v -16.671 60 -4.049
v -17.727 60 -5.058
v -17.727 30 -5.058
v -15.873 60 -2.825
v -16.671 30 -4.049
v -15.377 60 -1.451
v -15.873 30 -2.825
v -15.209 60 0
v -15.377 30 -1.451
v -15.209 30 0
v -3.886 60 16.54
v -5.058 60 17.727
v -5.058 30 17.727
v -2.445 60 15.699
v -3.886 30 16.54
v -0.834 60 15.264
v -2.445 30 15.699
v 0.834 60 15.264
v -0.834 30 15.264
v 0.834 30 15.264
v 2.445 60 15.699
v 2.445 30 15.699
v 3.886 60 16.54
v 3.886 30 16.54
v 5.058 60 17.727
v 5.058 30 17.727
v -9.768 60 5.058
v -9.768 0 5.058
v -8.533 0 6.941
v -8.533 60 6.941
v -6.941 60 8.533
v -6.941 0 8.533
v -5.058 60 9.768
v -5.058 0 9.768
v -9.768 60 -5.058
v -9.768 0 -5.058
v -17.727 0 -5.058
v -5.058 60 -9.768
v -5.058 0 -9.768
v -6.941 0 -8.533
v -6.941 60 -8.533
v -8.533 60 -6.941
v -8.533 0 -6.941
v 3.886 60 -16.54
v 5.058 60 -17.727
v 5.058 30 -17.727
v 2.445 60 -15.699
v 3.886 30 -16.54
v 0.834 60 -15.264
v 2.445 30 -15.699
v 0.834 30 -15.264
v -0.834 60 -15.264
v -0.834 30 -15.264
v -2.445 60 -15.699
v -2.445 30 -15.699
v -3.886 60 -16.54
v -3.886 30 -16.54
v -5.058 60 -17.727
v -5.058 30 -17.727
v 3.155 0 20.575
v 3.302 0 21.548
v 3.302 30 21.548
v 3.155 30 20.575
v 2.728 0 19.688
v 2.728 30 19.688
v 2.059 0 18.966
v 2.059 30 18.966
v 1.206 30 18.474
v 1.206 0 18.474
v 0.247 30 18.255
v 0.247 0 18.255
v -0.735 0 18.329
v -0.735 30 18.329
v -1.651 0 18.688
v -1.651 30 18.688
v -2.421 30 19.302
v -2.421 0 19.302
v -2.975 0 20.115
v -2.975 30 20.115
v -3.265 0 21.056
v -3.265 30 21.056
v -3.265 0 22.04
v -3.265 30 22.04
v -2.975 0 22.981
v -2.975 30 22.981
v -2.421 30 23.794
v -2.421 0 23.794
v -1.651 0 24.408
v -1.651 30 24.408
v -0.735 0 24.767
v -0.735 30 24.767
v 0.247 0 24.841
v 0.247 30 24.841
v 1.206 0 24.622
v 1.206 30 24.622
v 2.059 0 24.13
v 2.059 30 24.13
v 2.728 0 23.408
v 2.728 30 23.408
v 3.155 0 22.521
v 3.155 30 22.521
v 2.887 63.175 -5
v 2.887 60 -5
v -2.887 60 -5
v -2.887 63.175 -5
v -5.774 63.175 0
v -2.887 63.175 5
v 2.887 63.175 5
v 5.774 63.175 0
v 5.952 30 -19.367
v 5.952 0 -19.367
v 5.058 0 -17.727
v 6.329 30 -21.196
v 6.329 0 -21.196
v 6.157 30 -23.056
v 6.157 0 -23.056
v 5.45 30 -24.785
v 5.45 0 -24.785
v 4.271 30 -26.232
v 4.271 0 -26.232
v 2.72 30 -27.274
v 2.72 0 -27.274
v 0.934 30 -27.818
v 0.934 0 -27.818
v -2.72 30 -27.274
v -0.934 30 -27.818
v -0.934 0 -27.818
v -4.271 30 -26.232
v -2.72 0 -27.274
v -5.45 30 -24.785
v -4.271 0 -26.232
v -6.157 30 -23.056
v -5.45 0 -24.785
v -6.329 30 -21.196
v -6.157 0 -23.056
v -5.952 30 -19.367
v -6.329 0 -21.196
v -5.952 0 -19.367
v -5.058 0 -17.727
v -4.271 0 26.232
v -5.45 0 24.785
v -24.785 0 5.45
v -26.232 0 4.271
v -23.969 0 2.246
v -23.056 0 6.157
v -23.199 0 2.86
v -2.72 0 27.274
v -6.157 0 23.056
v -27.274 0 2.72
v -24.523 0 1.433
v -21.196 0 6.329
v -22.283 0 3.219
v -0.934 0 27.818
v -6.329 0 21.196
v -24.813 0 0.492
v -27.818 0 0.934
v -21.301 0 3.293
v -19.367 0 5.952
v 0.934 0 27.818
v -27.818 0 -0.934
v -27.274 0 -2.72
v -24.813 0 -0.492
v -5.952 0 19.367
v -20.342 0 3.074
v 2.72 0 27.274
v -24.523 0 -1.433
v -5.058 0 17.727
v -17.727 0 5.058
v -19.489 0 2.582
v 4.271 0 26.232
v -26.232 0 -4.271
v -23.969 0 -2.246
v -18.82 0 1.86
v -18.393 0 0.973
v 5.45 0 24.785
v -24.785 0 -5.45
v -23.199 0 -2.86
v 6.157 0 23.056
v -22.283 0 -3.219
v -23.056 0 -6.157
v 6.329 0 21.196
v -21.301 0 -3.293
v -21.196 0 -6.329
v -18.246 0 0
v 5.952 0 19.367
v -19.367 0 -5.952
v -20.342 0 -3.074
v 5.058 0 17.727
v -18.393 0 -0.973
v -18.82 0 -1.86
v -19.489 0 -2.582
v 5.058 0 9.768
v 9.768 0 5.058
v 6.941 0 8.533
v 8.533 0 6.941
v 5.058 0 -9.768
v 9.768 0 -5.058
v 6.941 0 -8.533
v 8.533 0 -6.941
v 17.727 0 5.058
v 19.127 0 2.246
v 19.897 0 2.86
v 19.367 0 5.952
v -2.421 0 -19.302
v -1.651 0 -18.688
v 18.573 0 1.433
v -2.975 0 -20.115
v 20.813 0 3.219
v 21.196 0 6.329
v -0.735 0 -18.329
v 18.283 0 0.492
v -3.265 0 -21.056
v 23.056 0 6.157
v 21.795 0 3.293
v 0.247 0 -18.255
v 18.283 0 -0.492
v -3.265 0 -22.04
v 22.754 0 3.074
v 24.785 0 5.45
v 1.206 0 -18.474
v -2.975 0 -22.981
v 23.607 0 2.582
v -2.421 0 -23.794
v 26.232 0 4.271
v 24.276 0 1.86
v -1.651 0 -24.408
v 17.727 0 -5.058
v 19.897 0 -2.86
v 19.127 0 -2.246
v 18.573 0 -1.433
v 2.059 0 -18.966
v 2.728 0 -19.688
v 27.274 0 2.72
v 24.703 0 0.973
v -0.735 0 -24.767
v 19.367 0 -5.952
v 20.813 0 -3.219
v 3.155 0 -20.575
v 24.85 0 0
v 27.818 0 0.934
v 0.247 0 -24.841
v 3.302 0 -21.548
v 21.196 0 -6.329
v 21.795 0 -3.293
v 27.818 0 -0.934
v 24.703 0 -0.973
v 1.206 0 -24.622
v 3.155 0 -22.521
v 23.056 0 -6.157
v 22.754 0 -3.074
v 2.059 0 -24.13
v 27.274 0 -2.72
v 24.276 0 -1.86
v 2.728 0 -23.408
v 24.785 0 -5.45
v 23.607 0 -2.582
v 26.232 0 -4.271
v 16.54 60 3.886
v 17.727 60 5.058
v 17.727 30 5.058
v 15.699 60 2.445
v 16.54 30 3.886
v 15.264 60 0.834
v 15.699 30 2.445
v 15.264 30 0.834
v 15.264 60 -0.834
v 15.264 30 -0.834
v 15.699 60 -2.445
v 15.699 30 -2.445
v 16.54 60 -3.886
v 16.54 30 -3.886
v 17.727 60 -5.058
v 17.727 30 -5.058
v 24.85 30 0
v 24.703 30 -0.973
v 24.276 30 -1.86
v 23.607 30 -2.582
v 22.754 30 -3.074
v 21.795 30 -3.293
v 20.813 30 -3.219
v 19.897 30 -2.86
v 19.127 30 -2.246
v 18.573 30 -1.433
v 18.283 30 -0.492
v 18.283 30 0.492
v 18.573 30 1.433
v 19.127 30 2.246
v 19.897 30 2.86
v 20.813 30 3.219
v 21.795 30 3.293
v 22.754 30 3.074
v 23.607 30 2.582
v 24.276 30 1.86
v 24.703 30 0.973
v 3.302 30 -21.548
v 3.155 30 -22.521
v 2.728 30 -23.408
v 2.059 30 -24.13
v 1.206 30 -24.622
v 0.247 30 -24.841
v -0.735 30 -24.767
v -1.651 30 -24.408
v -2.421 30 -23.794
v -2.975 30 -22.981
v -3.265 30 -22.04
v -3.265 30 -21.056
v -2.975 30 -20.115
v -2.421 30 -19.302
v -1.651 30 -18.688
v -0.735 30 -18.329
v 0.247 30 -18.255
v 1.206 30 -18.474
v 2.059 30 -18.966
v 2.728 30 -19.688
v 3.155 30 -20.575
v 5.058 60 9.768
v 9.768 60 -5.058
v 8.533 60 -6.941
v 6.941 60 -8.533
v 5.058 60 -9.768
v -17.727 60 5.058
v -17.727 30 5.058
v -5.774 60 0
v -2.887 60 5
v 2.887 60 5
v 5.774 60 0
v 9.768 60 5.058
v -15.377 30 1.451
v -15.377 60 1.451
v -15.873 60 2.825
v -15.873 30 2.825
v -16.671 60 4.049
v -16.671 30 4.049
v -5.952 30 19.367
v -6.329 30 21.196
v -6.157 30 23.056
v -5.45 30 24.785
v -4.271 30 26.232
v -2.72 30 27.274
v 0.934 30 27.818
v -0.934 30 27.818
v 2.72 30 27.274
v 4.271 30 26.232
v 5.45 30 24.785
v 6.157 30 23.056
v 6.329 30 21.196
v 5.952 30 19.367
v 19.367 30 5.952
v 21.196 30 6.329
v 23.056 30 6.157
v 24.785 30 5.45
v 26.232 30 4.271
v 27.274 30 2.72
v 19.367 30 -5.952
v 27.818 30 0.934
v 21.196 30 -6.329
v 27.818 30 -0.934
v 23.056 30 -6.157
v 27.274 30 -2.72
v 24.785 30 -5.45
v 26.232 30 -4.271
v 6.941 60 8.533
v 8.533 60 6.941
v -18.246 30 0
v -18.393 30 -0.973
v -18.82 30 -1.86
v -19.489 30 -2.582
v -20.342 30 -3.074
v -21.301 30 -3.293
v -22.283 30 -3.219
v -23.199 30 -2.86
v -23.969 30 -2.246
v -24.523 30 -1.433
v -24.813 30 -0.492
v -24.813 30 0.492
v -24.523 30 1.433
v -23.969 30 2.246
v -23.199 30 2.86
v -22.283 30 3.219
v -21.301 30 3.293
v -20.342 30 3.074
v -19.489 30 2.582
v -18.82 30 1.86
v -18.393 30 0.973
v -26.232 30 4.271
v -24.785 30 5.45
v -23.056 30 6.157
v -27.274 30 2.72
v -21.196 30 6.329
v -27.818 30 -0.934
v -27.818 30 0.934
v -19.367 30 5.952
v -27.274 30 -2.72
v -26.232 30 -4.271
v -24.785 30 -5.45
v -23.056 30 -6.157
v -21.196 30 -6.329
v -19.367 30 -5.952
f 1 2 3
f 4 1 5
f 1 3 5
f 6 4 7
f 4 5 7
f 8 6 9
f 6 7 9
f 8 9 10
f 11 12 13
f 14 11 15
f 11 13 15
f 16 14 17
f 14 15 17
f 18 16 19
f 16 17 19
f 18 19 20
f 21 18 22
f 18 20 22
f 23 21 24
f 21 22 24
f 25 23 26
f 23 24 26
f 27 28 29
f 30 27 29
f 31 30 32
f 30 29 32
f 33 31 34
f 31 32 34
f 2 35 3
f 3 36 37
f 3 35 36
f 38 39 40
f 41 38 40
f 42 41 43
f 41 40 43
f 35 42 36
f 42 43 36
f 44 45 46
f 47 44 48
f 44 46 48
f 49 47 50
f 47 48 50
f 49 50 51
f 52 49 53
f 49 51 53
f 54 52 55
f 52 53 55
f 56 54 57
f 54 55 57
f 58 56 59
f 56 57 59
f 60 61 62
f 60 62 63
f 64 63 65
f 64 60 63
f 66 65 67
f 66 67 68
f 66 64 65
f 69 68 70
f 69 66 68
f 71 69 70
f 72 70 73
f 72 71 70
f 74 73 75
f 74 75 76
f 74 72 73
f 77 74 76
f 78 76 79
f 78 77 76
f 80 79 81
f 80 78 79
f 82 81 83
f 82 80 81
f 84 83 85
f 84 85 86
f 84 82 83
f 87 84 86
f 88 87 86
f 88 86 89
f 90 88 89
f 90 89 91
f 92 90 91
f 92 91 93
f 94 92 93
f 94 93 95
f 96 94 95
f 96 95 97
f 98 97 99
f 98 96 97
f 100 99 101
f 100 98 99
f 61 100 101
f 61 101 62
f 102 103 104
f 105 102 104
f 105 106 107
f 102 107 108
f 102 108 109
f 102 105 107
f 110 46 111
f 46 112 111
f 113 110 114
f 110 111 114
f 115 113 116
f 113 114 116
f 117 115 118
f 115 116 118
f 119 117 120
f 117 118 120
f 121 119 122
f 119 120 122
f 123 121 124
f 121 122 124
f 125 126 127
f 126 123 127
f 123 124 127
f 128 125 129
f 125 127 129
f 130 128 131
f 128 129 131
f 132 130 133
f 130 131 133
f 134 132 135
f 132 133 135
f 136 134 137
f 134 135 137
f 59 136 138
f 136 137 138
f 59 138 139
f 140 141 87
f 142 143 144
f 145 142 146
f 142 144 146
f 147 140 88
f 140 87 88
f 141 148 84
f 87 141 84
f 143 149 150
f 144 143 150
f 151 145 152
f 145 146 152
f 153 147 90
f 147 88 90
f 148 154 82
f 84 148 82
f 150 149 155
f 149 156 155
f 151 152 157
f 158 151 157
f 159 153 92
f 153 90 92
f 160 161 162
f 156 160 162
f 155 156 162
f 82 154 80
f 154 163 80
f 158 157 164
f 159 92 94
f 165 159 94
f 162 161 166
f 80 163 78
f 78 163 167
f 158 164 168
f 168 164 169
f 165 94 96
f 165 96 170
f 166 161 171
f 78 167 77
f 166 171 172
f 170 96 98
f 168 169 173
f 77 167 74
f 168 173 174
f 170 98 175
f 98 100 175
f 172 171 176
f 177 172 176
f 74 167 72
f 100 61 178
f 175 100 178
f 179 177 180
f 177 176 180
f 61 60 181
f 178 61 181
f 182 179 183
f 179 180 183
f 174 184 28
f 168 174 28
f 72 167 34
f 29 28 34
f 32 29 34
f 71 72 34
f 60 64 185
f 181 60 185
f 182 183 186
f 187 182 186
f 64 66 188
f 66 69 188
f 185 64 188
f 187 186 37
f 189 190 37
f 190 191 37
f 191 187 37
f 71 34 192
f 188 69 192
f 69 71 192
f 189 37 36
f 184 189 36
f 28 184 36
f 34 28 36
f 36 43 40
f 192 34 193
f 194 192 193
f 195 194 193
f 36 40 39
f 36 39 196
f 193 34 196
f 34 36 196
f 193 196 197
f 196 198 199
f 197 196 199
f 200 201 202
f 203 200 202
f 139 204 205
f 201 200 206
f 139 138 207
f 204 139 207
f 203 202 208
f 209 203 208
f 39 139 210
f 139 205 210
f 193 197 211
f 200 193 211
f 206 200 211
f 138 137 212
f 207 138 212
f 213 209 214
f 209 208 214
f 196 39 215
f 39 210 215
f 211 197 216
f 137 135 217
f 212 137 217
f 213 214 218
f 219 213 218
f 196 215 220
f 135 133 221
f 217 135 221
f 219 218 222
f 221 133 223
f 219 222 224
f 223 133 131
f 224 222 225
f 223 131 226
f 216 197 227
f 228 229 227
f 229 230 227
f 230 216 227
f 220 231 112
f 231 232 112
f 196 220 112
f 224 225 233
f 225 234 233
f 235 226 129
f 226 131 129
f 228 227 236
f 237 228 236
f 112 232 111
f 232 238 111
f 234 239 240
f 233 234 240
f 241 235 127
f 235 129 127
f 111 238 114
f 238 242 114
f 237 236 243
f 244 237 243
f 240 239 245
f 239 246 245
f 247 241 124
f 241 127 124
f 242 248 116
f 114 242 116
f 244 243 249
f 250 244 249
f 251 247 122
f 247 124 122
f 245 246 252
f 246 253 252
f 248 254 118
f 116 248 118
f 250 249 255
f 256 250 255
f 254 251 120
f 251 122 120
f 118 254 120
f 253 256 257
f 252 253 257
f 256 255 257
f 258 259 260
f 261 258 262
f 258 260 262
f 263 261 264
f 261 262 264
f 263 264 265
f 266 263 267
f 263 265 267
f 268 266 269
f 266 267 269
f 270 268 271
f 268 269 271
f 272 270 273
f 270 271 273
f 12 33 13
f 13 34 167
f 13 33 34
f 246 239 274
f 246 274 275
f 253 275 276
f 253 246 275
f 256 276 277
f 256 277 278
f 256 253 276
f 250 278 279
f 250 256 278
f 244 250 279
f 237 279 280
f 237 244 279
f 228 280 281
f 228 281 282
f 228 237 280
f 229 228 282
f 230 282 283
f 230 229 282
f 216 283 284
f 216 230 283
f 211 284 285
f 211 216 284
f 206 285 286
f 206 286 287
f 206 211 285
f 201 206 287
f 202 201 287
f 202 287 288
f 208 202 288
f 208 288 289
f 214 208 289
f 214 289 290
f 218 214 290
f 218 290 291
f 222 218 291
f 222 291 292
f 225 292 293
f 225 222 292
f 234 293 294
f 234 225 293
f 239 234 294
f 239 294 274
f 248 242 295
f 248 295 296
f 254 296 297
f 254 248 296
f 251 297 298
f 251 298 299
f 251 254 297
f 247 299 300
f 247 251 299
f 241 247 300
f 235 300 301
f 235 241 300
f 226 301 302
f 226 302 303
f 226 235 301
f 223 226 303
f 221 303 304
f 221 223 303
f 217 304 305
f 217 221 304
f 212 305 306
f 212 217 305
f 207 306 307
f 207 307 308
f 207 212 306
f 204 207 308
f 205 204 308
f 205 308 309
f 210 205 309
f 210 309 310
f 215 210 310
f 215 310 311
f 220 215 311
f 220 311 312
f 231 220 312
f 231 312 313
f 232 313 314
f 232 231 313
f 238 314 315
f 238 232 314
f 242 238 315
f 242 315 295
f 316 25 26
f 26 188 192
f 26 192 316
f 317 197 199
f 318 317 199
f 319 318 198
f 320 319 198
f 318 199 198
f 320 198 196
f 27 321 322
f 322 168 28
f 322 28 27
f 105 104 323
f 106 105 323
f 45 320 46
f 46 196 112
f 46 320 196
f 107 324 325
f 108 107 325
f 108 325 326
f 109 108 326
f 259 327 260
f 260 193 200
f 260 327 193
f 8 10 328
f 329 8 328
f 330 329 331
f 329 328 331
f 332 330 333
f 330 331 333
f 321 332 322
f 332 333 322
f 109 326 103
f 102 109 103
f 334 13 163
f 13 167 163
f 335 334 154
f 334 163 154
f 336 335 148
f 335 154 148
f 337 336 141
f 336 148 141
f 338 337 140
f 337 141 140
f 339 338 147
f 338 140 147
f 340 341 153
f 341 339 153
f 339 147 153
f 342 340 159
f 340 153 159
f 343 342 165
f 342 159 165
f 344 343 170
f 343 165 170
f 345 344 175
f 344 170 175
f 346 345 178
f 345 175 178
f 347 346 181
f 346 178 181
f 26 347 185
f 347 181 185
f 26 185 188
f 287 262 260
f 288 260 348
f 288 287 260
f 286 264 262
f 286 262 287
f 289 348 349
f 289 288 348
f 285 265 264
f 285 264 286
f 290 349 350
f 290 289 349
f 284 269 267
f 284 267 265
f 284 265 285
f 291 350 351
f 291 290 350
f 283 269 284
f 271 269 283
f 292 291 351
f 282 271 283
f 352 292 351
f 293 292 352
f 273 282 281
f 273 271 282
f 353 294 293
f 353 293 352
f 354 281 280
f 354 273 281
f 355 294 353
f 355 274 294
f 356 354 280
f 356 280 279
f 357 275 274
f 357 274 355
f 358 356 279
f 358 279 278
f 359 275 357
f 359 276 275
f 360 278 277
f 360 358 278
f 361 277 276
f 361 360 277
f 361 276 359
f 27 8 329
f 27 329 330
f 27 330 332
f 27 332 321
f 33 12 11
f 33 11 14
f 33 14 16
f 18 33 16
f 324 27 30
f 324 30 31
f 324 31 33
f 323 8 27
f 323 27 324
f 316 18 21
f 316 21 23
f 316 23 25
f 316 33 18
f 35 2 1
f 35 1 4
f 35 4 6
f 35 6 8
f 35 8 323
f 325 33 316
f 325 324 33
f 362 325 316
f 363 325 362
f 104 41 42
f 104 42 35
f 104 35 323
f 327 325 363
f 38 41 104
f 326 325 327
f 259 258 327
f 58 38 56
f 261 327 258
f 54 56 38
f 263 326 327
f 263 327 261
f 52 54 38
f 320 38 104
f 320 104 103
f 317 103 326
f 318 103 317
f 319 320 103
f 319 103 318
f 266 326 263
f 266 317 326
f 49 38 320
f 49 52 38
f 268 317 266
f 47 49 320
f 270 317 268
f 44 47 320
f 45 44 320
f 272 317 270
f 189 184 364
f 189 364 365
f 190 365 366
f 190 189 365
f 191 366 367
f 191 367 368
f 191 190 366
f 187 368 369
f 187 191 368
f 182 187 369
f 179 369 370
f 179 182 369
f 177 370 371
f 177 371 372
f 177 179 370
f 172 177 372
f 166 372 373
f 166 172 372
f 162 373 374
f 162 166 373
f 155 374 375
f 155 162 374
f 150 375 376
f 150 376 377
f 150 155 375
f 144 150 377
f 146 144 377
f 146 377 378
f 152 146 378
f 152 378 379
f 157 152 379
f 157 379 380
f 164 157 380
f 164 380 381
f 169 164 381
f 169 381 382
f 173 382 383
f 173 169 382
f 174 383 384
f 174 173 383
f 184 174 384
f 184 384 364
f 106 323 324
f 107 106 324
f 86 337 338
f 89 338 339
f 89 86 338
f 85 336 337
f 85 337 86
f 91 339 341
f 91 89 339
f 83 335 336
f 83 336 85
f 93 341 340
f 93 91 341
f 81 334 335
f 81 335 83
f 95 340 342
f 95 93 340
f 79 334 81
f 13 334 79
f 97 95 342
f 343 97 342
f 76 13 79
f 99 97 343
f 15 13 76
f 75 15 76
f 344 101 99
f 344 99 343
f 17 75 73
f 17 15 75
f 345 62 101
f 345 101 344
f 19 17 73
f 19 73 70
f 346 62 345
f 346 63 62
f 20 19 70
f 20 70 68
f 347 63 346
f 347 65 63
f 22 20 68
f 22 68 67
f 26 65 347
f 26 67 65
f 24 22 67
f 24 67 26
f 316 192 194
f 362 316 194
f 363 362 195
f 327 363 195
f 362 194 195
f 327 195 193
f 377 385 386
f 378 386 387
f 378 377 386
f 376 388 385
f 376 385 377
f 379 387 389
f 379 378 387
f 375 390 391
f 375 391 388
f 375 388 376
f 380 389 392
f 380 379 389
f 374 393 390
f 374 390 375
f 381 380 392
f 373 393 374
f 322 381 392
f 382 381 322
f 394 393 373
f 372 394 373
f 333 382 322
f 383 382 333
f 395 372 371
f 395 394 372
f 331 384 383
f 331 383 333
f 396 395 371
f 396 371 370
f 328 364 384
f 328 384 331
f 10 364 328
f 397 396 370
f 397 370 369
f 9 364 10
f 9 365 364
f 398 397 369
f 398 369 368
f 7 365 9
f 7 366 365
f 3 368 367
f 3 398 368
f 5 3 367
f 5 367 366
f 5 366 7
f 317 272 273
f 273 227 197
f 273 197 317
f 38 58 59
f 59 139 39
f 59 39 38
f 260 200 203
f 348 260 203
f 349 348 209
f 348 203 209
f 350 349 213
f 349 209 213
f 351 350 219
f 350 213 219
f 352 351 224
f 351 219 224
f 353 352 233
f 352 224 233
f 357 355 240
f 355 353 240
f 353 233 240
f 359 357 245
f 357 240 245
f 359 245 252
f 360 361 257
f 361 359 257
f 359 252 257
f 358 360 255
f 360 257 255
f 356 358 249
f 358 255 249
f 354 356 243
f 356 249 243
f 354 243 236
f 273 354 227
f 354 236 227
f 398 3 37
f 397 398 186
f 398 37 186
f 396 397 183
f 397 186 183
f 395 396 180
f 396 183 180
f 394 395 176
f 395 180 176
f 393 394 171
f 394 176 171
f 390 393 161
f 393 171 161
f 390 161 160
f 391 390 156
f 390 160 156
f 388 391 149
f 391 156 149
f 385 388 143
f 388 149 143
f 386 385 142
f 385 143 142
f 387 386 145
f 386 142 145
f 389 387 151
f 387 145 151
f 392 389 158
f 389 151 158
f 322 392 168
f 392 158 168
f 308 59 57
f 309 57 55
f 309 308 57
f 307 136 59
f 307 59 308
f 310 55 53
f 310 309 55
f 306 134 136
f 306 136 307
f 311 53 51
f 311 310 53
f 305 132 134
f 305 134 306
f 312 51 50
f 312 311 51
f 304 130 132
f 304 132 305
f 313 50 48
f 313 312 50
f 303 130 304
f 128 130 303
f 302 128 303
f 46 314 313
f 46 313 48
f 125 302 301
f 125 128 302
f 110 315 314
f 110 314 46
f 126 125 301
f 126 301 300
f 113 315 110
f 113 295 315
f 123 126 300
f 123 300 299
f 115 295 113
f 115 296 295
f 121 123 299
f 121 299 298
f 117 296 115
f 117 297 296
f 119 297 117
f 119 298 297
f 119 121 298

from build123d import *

# Parameters (mm, degrees)
BOSS_EXTRUDE1_DEPTH = 60
SKETCH1_3_R         = 6.339
SKETCH1_3_R_2       = 3.302
BOSS_EXTRUDE2_DEPTH = 30
BOSS_EXTRUDE3_DEPTH = 3.175


with BuildPart() as part:
    # Sketch1 → Boss-Extrude1 (new body)
    with BuildSketch(Plane(origin=(0, 0, 0), x_dir=(1, 0, 0), z_dir=(0, 1, 0))):
        with BuildLine():
            ThreePointArc((17.727459811, -5.058299483), (15.209, 0), (17.727459811, 5.058299483))
            Line((17.727459811, 5.058299483), (9.767988858, 5.058299483))
            ThreePointArc((9.767988858, 5.058299483), (7.778174593, 7.778174593), (5.058299483, 9.767988858))
            Line((5.058299483, 9.767988858), (5.058299483, 17.727459811))
            ThreePointArc((5.058299483, 17.727459811), (0, 15.209), (-5.058299483, 17.727459811))
            Line((-5.058299483, 17.727459811), (-5.058299483, 9.767988858))
            ThreePointArc((-5.058299483, 9.767988858), (-7.778174593, 7.778174593), (-9.767988858, 5.058299483))
            Line((-9.767988858, 5.058299483), (-17.727459811, 5.058299483))
            ThreePointArc((-17.727459811, 5.058299483), (-15.209, 0), (-17.727459811, -5.058299483))
            Line((-17.727459811, -5.058299483), (-9.767988858, -5.058299483))
            ThreePointArc((-9.767988858, -5.058299483), (-7.778174593, -7.778174593), (-5.058299483, -9.767988858))
            Line((-5.058299483, -9.767988858), (-5.058299483, -17.727459811))
            ThreePointArc((-5.058299483, -17.727459811), (0, -15.209), (5.058299483, -17.727459811))
            Line((5.058299483, -17.727459811), (5.058299483, -9.767988858))
            ThreePointArc((5.058299483, -9.767988858), (7.778174593, -7.778174593), (9.767988858, -5.058299483))
            Line((9.767988858, -5.058299483), (17.727459811, -5.058299483))
        make_face()
    extrude(amount=BOSS_EXTRUDE1_DEPTH)

    # Sketch1<3> → Boss-Extrude2 (add)
    # profile 1 of 4: a face of its own
    with BuildSketch(Plane(origin=(0, 0, 0), x_dir=(1, 0, 0), z_dir=(0, 1, 0))):
        with Locations((21.548, 0)):
            Circle(SKETCH1_3_R)
        with Locations((21.548, 0)):
            Circle(SKETCH1_3_R_2, mode=Mode.SUBTRACT)
    # profile 2 of 4: a face of its own
    with BuildSketch(Plane(origin=(0, 0, 0), x_dir=(1, 0, 0), z_dir=(0, 1, 0))):
        with Locations((0, 21.548)):
            Circle(SKETCH1_3_R)
        with Locations((0, 21.548)):
            Circle(SKETCH1_3_R_2, mode=Mode.SUBTRACT)
    # profile 3 of 4: a face of its own
    with BuildSketch(Plane(origin=(0, 0, 0), x_dir=(1, 0, 0), z_dir=(0, 1, 0))):
        with Locations((0, -21.548)):
            Circle(SKETCH1_3_R)
        with Locations((0, -21.548)):
            Circle(SKETCH1_3_R_2, mode=Mode.SUBTRACT)
    # profile 4 of 4: a face of its own
    with BuildSketch(Plane(origin=(0, 0, 0), x_dir=(1, 0, 0), z_dir=(0, 1, 0))):
        with Locations((-21.548, 0)):
            Circle(SKETCH1_3_R)
        with Locations((-21.548, 0)):
            Circle(SKETCH1_3_R_2, mode=Mode.SUBTRACT)
    extrude(amount=BOSS_EXTRUDE2_DEPTH)

    # Sketch2 → Boss-Extrude3 (add)
    with BuildSketch(Plane(origin=(0, 60, 0), x_dir=(1, 0, 0), z_dir=(0, 1, 0))):
        Polygon((5.773502692, 0), (2.886751346, 5), (-2.886751346, 5), (-5.773502692, 0), (-2.886751346, -5), (2.886751346, -5), align=None)
    extrude(amount=BOSS_EXTRUDE3_DEPTH)


solid = part.part
